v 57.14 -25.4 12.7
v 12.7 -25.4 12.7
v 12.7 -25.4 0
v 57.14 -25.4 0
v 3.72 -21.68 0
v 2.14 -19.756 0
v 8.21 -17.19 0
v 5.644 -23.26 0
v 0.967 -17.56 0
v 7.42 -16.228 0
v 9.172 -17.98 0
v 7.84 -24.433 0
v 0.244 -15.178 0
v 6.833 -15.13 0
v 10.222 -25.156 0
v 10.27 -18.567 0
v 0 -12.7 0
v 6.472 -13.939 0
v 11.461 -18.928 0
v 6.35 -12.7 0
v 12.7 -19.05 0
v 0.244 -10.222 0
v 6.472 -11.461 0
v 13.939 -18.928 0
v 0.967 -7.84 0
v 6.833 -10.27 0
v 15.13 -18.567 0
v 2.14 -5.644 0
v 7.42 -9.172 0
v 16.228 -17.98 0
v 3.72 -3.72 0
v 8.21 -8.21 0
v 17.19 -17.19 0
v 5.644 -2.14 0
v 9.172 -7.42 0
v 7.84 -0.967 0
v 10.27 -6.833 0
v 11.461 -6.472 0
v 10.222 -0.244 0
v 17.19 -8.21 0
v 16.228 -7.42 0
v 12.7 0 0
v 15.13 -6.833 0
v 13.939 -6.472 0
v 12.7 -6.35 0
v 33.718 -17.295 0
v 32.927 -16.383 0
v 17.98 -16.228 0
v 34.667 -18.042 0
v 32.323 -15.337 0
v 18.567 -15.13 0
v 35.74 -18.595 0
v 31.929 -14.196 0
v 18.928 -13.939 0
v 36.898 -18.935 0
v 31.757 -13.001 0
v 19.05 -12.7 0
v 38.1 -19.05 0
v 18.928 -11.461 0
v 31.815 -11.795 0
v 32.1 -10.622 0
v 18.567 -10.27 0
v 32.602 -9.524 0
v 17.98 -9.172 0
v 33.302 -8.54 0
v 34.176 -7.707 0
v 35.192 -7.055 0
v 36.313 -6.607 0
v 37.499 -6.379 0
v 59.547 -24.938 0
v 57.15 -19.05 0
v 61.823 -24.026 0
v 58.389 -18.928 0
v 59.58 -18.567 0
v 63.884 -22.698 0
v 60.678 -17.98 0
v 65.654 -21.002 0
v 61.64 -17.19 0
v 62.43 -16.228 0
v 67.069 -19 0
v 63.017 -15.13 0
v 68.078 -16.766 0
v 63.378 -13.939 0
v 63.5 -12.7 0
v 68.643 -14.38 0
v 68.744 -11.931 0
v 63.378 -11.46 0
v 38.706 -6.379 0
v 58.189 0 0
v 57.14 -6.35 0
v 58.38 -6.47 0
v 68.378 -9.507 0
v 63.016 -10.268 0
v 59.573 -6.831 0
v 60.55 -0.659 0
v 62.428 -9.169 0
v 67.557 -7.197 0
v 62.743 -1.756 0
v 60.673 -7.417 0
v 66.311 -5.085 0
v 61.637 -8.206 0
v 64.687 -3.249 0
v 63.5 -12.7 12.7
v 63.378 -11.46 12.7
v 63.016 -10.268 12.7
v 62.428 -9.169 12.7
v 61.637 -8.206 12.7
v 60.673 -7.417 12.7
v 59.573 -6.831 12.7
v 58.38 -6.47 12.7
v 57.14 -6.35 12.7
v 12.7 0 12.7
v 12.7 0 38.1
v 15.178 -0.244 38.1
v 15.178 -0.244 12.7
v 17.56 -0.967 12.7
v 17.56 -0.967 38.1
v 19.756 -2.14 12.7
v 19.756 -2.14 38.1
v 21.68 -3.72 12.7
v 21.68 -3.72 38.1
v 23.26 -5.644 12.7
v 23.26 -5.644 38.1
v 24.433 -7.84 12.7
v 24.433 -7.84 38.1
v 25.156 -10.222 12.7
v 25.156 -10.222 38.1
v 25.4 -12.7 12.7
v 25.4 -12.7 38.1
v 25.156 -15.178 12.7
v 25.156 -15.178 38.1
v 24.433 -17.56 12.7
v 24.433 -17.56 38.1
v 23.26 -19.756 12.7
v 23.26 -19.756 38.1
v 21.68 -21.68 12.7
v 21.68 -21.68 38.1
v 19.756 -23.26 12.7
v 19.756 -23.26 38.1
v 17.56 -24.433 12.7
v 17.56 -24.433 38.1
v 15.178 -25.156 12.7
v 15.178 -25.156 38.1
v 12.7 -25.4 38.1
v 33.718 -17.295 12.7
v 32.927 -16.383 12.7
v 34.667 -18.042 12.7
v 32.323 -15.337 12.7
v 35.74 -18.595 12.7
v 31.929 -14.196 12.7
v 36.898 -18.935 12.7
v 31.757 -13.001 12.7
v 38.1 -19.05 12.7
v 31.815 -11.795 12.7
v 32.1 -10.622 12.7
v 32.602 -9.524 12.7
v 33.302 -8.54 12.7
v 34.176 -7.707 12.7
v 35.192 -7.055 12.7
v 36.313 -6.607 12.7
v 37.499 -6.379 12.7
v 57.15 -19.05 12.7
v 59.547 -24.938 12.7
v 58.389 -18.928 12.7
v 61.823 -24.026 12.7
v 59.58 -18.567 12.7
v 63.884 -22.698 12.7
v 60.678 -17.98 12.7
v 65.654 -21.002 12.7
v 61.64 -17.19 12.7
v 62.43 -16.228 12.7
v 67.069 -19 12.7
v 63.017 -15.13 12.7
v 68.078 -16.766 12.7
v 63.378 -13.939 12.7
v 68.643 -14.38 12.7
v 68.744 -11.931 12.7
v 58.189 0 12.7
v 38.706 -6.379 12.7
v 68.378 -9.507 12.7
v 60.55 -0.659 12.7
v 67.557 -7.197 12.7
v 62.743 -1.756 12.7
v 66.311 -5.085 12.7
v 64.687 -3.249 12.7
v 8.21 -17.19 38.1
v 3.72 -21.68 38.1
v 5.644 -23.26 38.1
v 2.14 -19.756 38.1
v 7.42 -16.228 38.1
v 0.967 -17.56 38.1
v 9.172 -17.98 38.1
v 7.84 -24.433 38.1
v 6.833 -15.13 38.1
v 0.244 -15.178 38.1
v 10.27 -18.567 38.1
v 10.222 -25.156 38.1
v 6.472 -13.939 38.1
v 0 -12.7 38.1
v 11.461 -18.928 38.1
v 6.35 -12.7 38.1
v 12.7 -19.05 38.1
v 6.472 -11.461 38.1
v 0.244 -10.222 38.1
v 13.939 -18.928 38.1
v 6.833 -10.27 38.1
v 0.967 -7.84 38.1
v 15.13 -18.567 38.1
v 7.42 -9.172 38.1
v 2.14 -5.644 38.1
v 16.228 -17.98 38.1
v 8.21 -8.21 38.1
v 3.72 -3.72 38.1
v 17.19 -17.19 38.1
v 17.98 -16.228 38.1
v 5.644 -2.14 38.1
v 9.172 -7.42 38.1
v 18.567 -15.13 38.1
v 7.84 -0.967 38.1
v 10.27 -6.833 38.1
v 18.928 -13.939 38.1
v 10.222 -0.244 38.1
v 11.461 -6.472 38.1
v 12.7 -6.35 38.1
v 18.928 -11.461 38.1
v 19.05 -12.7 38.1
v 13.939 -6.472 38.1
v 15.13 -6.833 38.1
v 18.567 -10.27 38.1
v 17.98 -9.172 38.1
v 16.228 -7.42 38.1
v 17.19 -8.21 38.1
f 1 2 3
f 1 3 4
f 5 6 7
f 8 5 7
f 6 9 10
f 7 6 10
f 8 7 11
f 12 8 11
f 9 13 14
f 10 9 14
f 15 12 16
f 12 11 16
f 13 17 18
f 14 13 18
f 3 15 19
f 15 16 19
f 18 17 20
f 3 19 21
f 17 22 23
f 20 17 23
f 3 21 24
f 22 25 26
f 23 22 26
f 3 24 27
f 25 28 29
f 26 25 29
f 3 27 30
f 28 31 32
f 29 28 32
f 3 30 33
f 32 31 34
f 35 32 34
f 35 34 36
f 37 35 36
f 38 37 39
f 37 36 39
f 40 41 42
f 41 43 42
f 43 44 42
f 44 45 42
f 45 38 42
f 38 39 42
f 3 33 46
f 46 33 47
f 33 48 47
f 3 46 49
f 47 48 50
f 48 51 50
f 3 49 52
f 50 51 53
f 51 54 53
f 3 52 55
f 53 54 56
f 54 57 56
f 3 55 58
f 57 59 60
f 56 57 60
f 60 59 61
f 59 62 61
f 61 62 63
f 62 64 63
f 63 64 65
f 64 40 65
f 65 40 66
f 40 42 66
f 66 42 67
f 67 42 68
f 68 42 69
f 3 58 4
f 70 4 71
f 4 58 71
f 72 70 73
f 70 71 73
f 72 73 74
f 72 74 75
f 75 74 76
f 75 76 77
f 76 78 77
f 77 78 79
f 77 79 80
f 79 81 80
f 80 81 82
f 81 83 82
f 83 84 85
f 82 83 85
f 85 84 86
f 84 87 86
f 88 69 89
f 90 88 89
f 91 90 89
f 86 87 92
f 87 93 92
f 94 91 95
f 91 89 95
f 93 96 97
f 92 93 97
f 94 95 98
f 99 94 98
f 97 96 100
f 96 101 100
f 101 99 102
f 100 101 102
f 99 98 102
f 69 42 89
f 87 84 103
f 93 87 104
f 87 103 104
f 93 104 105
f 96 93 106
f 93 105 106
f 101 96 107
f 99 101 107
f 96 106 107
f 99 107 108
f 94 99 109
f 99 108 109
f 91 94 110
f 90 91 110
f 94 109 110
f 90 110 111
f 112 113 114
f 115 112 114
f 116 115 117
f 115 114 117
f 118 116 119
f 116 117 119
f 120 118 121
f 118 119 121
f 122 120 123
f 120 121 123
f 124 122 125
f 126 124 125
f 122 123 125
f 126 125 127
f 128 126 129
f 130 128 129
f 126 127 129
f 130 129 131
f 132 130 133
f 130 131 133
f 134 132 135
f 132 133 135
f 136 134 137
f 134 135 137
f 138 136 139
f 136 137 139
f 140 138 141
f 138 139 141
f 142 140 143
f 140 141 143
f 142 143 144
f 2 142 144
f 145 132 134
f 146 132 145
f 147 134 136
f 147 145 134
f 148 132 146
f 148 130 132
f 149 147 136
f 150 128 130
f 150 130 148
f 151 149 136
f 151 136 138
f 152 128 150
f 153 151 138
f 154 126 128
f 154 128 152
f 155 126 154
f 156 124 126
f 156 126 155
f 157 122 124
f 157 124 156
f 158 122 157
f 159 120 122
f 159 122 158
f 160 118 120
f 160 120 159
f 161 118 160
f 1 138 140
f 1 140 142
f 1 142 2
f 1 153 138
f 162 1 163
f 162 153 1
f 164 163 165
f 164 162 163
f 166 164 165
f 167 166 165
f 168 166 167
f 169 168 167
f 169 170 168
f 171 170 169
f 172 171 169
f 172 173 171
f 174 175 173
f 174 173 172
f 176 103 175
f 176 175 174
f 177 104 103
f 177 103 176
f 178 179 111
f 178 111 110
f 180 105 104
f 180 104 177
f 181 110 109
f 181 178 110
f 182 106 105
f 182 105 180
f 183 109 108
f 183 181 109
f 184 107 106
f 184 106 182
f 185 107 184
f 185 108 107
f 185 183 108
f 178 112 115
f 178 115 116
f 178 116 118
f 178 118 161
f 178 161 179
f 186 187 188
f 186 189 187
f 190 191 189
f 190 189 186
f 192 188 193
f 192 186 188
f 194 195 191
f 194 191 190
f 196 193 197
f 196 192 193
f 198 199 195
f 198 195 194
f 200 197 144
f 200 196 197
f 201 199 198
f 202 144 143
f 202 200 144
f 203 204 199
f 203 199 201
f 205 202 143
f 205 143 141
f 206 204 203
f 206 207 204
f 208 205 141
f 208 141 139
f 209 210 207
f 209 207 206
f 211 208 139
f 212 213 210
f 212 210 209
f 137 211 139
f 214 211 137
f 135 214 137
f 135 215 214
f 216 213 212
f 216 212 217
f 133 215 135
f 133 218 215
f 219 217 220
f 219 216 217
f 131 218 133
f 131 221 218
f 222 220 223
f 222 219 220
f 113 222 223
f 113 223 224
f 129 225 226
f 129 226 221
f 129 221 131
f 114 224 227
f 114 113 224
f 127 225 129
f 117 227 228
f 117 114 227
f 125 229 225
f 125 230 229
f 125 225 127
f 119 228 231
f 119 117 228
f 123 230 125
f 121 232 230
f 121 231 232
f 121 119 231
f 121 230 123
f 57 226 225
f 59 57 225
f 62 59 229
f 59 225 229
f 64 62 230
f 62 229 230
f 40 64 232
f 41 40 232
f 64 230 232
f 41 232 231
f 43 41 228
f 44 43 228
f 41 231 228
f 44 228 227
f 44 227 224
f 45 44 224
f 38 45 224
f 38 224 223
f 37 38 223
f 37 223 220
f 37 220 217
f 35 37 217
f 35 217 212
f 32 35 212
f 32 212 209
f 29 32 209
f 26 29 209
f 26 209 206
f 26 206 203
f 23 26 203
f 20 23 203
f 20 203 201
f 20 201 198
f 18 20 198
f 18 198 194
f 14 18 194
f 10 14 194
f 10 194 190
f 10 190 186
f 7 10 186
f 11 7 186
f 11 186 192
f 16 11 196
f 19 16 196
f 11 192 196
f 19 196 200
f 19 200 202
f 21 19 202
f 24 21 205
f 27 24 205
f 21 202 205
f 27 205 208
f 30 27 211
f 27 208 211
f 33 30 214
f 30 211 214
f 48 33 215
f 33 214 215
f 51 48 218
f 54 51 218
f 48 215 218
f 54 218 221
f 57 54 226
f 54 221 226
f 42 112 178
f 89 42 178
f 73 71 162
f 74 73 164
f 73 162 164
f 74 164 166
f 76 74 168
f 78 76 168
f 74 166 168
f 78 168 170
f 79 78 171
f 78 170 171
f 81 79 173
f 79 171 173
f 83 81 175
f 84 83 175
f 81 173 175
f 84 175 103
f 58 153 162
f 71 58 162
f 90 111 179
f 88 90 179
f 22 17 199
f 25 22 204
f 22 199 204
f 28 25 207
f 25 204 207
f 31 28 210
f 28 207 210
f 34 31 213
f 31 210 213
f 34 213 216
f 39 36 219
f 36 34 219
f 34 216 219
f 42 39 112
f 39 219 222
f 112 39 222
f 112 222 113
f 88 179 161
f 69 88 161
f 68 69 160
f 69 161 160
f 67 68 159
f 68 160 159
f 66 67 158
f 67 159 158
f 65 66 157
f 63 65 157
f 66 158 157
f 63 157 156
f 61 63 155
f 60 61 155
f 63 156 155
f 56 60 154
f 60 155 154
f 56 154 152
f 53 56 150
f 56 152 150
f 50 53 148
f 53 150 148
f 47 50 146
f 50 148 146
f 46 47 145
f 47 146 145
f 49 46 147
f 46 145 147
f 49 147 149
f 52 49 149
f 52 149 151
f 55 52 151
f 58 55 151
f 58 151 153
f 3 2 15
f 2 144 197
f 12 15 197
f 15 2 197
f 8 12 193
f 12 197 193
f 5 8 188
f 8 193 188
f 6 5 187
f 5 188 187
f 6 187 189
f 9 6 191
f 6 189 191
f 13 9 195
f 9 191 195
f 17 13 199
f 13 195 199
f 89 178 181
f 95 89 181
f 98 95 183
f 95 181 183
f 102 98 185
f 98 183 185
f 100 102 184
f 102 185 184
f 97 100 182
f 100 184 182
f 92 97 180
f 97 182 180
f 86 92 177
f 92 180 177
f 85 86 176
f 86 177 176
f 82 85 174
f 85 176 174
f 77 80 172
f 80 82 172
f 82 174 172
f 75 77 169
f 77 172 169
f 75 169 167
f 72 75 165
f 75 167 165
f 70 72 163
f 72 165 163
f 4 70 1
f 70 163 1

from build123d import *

# Parameters (mm, degrees)
F0_W      = 69.85
F0_H      = 38.1
F1_DEPTH  = 25.4
F5_DEPTH  = 50.8
F7_DEPTH  = 25.4
F8_R      = 6.35
F9_DEPTH  = 50.8
F11_DEPTH = 25.4
F13_DEPTH = 25.4


# Not quite as in the source:
# - a feature of the source that left no trace in its solid (it failed there, or was rolled back) is left out


with BuildPart() as f1:
    # F0 (on Front) → F1 (new body)
    with BuildSketch(Plane.XZ):
        with Locations((34.925, 19.05)):
            Rectangle(F0_W, F0_H)
    extrude(amount=F1_DEPTH)

    # F4 (on face) → F5 (cut)
    with BuildSketch(Plane.XY.offset(38.1)):
        with BuildLine():
            ThreePointArc((0, -12.7), (3.7197438789, -3.7197438789), (12.7, 0))
            Line((12.7, 0), (0, 0))
            Line((0, 0), (0, -12.7))
        make_face()
        with BuildLine():
            Line((0, -25.4), (12.7, -25.4))
            ThreePointArc((12.7, -25.4), (3.7197438789, -21.6802561211), (0, -12.7))
            Line((0, -12.7), (0, -25.4))
        make_face()
    extrude(amount=-F5_DEPTH, mode=Mode.SUBTRACT)

    # F6 (on face) → F7 (cut)
    with BuildSketch(Plane.XY.offset(38.1)):
        with BuildLine():
            ThreePointArc((12.7, 0), (25.4, -12.7), (12.7, -25.4))
            Line((12.7, -25.4), (69.85, -25.4))
            Line((69.85, -25.4), (69.85, 0))
            Line((69.85, 0), (12.7, 0))
        make_face()
    extrude(amount=-F7_DEPTH, mode=Mode.SUBTRACT)

    # F8 (on face) → F9 (cut)
    with BuildSketch(Plane.XY.offset(38.1)):
        with Locations((12.7, -12.7)):
            Circle(F8_R)
    extrude(amount=-F9_DEPTH, mode=Mode.SUBTRACT)

    # F10 (on face) → F11 (cut)
    with BuildSketch(Plane.XY.offset(12.7)):
        with BuildLine():
            ThreePointArc((38.1, -19.05), (42.5901280605, -17.1901280605), (44.45, -12.7))
            ThreePointArc((44.45, -12.7), (42.7995135722, -8.4295114817), (38.7060402567, -6.37898622))
            Line((38.7060402567, -6.37898622), (38.1, -19.05))
        make_face()
        with BuildLine():
            ThreePointArc((38.7060402567, -6.37898622), (42.7995135722, -8.4295114817), (44.45, -12.7))
            ThreePointArc((44.45, -12.7), (42.5901280605, -17.1901280605), (38.1, -19.05))
            Line((38.1, -19.05), (57.15, -19.05))
            ThreePointArc((57.15, -19.05), (50.8000019615, -12.7049911232), (57.1400177568, -6.3500078461))
            Line((57.1400177568, -6.3500078461), (38.7060402567, -6.37898622))
        make_face()
        with BuildLine():
            Line((38.1, -19.05), (38.7060402567, -6.37898622))
            ThreePointArc((38.7060402567, -6.37898622), (31.7572506946, -12.3966334751), (38.1, -19.05))
        make_face()
        with BuildLine():
            Line((57.15, -19.05), (57.1400177568, -6.3500078461))
            ThreePointArc((57.1400177568, -6.3500078461), (50.8000019615, -12.7049911232), (57.15, -19.05))
        make_face()
        with BuildLine():
            ThreePointArc((63.5, -12.7), (61.6365974165, -8.2063440694), (57.1400177568, -6.3500078461))
            Line((57.1400177568, -6.3500078461), (57.15, -19.05))
            ThreePointArc((57.15, -19.05), (61.6401280605, -17.1901280605), (63.5, -12.7))
        make_face()
    extrude(amount=-F11_DEPTH, mode=Mode.SUBTRACT)

    # F12 (on face) → F13 (cut)
    with BuildSketch(Plane.XY.offset(12.7)):
        with BuildLine():
            ThreePointArc((58.1890903413, 0), (68.7523295615, -13.1579480832), (57.1400177568, -25.4))
            Line((57.1400177568, -25.4), (69.85, -25.4))
            Line((69.85, -25.4), (69.85, 0))
            Line((69.85, 0), (58.1890903413, 0))
        make_face()
    extrude(amount=-F13_DEPTH, mode=Mode.SUBTRACT)


solid = f1.part
